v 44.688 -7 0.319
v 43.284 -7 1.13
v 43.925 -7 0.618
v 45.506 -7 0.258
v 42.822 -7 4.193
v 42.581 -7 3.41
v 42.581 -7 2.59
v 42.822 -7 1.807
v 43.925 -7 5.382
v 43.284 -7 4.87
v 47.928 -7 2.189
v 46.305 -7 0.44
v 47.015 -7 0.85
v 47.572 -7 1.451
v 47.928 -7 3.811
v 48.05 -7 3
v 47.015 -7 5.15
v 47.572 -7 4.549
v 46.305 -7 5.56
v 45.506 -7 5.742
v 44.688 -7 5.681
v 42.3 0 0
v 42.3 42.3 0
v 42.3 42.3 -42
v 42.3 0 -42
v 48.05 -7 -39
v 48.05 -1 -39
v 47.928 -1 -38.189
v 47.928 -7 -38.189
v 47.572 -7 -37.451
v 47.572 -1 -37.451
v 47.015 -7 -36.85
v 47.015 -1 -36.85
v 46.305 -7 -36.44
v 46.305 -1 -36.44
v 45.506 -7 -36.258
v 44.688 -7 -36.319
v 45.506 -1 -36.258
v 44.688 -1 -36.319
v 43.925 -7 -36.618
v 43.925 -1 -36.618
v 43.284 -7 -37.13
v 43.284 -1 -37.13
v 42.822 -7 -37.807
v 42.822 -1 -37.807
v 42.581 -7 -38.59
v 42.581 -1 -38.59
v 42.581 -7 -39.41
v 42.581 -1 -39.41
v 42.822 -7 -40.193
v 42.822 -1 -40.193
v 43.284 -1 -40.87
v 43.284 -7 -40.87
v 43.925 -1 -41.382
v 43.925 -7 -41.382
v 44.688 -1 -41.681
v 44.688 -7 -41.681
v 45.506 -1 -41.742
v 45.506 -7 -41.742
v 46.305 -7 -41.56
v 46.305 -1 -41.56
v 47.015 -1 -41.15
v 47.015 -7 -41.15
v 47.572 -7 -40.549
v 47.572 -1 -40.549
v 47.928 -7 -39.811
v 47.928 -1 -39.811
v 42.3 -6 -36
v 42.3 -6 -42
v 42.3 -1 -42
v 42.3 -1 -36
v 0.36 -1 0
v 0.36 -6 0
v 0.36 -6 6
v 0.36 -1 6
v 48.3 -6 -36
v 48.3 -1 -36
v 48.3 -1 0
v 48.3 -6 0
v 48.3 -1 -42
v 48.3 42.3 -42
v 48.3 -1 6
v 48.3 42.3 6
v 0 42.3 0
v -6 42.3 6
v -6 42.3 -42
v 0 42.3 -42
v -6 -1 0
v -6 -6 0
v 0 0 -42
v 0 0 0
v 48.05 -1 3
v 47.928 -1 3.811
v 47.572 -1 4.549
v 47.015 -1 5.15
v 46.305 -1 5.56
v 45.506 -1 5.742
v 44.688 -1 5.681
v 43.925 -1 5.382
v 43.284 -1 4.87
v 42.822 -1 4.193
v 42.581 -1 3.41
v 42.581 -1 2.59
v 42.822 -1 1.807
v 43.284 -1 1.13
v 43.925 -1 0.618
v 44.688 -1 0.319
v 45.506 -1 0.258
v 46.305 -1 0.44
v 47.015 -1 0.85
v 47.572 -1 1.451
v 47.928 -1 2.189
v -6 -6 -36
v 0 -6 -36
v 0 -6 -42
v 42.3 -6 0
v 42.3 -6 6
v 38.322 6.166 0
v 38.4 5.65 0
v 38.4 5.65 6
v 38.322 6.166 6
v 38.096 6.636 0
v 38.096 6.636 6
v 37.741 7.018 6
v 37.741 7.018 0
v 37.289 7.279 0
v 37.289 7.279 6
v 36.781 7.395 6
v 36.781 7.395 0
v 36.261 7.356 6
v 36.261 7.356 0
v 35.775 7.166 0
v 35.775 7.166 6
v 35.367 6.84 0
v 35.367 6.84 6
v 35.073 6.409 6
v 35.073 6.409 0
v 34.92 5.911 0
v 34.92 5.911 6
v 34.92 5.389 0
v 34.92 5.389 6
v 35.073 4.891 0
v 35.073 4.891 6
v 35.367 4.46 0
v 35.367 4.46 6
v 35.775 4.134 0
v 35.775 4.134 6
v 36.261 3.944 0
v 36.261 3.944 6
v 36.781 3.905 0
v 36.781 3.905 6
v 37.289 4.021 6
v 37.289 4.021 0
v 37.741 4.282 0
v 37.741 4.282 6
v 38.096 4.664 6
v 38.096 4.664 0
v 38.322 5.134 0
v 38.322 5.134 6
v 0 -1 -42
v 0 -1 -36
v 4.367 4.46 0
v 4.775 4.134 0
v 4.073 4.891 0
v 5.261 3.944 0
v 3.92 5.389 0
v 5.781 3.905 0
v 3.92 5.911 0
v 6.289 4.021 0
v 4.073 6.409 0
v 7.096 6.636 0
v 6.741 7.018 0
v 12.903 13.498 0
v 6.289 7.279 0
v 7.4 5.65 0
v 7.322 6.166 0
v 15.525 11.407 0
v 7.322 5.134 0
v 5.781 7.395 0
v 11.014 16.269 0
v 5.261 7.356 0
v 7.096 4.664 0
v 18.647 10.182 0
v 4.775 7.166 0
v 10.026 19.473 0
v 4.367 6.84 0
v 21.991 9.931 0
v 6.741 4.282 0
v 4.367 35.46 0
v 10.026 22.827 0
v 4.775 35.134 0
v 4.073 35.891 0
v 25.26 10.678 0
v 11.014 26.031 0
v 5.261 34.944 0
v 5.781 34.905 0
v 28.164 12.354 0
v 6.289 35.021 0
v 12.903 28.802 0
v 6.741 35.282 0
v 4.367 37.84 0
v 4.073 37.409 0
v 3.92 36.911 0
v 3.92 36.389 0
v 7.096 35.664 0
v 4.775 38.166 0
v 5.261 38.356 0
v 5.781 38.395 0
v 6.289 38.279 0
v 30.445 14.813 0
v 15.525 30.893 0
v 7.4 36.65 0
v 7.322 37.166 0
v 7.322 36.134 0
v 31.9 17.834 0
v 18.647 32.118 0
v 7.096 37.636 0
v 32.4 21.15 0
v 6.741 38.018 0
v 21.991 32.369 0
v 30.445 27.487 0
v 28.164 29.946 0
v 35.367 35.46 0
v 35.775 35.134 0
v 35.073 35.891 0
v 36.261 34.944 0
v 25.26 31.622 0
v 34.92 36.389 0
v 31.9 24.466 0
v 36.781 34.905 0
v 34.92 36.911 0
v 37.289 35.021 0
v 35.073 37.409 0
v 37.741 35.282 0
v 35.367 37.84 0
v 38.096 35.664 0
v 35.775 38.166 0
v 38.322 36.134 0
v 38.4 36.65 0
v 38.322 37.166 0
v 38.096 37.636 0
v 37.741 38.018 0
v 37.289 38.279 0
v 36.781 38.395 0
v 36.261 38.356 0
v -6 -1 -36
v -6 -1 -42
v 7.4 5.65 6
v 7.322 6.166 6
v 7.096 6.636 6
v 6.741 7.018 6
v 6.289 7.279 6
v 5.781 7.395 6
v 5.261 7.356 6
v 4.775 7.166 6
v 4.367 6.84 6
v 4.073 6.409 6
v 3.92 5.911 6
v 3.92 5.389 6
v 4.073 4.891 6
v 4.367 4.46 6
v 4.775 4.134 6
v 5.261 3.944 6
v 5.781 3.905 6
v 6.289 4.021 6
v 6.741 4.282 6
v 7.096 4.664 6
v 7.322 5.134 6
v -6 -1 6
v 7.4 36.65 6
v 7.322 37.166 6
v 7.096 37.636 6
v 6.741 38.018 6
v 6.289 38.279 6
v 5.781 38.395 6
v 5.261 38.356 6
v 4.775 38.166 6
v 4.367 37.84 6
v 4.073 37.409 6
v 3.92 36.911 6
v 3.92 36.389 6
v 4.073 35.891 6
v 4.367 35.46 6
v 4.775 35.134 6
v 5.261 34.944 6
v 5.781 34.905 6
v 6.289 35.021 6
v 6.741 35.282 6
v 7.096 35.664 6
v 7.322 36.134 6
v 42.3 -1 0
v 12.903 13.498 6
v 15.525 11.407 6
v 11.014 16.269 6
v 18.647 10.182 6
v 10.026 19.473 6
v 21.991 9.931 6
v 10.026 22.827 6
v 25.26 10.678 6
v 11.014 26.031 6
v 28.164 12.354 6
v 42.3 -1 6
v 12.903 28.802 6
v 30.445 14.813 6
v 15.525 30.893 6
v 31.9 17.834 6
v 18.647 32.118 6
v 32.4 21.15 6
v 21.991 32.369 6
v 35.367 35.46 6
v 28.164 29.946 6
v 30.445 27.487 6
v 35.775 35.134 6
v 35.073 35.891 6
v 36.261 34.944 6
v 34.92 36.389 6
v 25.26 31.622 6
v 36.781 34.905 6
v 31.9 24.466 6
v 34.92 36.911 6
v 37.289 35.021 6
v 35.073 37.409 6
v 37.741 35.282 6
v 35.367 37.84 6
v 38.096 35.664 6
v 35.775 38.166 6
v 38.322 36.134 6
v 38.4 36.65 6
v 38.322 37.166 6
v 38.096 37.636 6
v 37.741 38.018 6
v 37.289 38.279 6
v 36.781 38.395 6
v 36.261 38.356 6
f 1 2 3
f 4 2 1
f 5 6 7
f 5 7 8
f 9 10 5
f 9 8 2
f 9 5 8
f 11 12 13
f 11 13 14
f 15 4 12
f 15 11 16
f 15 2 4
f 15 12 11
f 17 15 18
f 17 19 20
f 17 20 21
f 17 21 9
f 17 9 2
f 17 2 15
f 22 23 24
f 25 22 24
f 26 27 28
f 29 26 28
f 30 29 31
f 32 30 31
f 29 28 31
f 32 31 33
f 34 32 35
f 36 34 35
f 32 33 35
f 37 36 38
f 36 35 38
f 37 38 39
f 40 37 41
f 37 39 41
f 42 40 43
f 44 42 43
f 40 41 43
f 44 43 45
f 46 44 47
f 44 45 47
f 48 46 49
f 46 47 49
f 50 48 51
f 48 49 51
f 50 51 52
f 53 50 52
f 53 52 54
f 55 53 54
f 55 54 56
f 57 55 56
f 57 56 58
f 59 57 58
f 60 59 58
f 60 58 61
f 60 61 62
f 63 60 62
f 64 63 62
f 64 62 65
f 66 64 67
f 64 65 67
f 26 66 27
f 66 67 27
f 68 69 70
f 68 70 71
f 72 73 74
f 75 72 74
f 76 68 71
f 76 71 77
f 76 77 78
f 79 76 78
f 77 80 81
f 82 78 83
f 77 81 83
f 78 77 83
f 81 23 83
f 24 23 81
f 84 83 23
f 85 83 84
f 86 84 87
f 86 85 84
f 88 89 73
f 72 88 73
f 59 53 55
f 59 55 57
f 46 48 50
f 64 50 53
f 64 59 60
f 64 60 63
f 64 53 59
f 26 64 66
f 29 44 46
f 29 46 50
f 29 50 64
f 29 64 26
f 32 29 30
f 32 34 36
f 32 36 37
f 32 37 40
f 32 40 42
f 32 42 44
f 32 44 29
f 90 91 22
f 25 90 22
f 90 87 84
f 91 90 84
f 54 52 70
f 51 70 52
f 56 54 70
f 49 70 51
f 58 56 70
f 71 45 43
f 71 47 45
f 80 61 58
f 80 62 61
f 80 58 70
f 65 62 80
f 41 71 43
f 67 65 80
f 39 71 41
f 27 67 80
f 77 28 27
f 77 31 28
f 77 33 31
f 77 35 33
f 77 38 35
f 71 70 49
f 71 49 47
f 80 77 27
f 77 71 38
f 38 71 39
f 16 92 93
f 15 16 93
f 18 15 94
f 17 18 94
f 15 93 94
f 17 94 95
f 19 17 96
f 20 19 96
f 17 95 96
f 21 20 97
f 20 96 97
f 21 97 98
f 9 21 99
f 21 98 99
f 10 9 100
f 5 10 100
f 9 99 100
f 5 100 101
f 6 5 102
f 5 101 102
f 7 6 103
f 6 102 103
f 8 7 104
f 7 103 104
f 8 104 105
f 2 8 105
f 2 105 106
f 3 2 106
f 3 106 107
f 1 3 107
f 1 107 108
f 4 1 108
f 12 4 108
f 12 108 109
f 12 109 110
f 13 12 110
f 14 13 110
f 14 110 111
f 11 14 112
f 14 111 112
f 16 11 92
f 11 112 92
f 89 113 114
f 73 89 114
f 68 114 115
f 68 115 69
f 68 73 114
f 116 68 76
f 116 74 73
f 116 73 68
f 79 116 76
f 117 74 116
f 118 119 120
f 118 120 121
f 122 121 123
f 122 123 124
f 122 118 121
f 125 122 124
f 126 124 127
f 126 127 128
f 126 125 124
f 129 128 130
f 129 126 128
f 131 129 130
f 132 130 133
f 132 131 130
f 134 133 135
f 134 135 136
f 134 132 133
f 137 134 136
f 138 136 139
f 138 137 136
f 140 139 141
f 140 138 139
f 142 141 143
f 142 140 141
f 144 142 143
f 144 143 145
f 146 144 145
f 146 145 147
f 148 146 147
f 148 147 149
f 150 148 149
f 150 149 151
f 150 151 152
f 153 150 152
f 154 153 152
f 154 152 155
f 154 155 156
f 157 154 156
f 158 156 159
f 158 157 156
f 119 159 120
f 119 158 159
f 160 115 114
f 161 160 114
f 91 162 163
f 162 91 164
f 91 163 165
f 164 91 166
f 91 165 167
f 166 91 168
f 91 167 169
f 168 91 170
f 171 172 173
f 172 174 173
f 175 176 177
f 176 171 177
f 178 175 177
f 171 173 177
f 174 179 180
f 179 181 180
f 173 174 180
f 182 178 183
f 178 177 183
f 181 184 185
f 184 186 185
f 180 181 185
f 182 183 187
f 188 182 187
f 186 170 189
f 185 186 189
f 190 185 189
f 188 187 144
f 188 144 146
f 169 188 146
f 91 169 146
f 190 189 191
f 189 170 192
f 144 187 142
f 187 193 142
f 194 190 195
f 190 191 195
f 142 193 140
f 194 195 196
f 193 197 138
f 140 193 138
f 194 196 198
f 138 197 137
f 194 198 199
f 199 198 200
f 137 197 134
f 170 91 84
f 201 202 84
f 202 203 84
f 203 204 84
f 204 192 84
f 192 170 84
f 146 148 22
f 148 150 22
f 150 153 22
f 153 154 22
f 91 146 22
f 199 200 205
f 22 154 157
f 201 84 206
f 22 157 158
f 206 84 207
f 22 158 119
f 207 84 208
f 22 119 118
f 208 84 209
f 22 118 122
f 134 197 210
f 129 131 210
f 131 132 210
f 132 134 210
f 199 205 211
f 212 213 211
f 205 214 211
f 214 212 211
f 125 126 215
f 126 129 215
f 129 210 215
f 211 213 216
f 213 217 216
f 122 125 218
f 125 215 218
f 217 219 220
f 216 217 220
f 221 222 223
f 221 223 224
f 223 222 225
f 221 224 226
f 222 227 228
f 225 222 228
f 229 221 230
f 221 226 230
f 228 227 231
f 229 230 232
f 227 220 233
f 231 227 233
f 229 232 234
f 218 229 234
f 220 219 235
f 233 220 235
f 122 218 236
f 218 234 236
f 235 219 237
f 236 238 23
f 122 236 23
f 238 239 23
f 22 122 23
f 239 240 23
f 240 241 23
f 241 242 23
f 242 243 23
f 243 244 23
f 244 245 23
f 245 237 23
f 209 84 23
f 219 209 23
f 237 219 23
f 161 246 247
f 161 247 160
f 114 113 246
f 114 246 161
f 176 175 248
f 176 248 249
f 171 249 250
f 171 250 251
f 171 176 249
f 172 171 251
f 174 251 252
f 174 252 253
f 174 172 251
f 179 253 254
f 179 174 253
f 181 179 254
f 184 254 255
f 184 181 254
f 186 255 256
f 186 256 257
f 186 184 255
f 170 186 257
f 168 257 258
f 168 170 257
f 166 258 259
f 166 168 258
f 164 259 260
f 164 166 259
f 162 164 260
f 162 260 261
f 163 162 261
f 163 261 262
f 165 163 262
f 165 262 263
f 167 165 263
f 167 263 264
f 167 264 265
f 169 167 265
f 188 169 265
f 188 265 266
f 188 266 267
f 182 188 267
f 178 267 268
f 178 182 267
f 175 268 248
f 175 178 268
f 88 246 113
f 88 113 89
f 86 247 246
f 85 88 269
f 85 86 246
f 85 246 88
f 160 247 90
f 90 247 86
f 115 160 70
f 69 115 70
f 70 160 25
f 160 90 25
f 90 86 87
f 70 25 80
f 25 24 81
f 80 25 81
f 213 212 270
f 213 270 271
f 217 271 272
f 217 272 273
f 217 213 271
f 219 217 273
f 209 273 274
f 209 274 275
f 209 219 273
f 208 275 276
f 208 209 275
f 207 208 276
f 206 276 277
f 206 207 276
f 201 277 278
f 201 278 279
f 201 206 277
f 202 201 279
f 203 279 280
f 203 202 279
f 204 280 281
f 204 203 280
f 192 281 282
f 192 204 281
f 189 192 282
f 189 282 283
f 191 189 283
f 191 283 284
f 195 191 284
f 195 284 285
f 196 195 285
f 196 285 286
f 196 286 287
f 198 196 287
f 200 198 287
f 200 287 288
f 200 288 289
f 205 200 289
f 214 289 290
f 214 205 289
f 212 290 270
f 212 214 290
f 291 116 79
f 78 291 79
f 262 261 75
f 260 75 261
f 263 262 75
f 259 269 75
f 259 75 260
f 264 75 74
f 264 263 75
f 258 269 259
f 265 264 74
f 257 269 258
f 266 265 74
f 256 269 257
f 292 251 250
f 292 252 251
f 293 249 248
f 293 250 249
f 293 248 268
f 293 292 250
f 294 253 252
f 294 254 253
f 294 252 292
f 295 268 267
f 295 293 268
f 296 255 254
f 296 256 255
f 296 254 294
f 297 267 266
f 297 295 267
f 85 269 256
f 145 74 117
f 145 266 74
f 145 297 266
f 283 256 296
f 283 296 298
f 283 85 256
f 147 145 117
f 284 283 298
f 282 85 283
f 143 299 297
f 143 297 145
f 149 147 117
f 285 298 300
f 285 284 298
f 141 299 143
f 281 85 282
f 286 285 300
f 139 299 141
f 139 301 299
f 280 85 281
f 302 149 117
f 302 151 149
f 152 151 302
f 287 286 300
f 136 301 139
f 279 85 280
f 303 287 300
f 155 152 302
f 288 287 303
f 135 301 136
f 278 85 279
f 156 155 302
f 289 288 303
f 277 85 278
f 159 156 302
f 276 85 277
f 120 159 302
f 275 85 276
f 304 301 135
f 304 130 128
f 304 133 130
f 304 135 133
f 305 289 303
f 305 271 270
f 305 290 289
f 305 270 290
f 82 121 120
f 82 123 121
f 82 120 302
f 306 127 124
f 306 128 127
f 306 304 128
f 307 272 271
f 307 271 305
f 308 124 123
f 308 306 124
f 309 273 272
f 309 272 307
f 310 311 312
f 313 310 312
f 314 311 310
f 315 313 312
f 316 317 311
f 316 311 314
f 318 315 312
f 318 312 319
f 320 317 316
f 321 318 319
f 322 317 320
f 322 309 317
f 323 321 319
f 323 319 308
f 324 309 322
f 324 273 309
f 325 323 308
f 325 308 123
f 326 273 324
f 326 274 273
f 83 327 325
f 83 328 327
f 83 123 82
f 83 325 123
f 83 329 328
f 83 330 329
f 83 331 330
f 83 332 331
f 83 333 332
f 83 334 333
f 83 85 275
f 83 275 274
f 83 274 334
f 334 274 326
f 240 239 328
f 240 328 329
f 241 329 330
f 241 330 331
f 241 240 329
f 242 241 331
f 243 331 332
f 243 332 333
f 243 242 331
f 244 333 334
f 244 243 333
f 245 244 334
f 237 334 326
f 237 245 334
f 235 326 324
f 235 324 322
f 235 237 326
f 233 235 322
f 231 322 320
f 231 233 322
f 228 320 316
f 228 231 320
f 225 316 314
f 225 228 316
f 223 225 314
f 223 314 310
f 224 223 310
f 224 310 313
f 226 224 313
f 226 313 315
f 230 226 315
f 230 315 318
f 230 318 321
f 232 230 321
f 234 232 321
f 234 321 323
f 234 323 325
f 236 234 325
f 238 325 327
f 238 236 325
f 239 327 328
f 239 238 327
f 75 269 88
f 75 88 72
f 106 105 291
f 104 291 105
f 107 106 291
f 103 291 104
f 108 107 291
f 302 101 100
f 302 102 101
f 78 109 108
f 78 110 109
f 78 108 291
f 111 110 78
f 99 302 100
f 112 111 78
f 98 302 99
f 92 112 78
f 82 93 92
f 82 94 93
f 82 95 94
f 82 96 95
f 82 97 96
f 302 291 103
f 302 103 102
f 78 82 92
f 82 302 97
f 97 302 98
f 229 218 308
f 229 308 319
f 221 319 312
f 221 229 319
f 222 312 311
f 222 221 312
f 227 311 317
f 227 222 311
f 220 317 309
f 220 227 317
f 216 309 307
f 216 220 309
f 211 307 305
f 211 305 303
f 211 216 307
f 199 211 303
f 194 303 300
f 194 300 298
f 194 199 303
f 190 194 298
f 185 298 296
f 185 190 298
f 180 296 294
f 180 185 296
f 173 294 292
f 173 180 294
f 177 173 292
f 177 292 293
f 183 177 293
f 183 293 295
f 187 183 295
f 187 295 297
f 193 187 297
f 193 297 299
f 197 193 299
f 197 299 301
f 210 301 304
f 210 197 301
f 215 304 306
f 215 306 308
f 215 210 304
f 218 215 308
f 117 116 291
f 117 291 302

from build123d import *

# Parameters (mm, degrees)
SKETCH_1_W          = 42.3
SKETCH_1_H          = 42.3
SKETCH_1_R          = 1.75
SKETCH_1_R_2        = 11.25
EXTRUDE_1_DEPTH     = 6
SKETCH_2_W          = 48
SKETCH_2_H          = 42.3
EXTRUDE_2_DEPTH     = 6
SKETCH_3_W          = 48
SKETCH_3_H          = 42.3
EXTRUDE_3_DEPTH     = 6
SKETCH_4_W          = 54.3
SKETCH_4_H          = 48
EXTRUDE_4_DEPTH     = 6
SKETCH_5_W          = 6
SKETCH_5_H          = 6
SKETCH_5_W_2        = 6.359997754
CUT_EXTRUDE_1_DEPTH = 5
SKETCH_6_R          = 2.75
EXTRUDE_5_DEPTH     = 6
SKETCH_7_R          = 2.75
EXTRUDE_6_DEPTH     = 6


with BuildPart() as part:
    # Эскиз1 → Бобышка-Вытянуть1 (new body)
    with BuildSketch(Plane.XY):
        with Locations((21.15, 21.15)):
            Rectangle(SKETCH_1_W, SKETCH_1_H)
        with Locations((36.65, 36.65)):
            Circle(SKETCH_1_R, mode=Mode.SUBTRACT)
        with Locations((5.65, 36.65)):
            Circle(SKETCH_1_R, mode=Mode.SUBTRACT)
        with Locations((5.65, 5.65)):
            Circle(SKETCH_1_R, mode=Mode.SUBTRACT)
        with Locations((36.65, 5.65)):
            Circle(SKETCH_1_R, mode=Mode.SUBTRACT)
        with Locations((21.15, 21.15)):
            Circle(SKETCH_1_R_2, mode=Mode.SUBTRACT)
    extrude(amount=EXTRUDE_1_DEPTH)

    # Эскиз2 → Бобышка-Вытянуть2 (add)
    with BuildSketch(Plane.ZY):
        with Locations((-18, 21.15)):
            Rectangle(SKETCH_2_W, SKETCH_2_H)
    extrude(amount=EXTRUDE_2_DEPTH)

    # Эскиз3 → Бобышка-Вытянуть3 (add)
    with BuildSketch(Plane(origin=(42.3, 0, 0), x_dir=(0, 0, -1), z_dir=(1, 0, 0))):
        with Locations((18, 21.15)):
            Rectangle(SKETCH_3_W, SKETCH_3_H)
    extrude(amount=EXTRUDE_3_DEPTH)

    # Эскиз4 → Бобышка-Вытянуть4 (add)
    with BuildSketch(Plane.XZ):
        with Locations((21.15, -18)):
            Rectangle(SKETCH_4_W, SKETCH_4_H)
    extrude(amount=EXTRUDE_4_DEPTH)

    # Эскиз5 → Вырез-Вытянуть1 (cut)
    with BuildSketch(Plane.XZ.offset(6)):
        with Locations((45.3, -39)):
            Rectangle(SKETCH_5_W, SKETCH_5_H)
        with Locations((-3, -39)):
            Rectangle(SKETCH_5_W, SKETCH_5_H)
        with Locations((-2.820001123, 3)):
            Rectangle(SKETCH_5_W_2, SKETCH_5_H)
        with Locations((45.3, 3)):
            Rectangle(SKETCH_5_W, SKETCH_5_H)
    extrude(amount=-CUT_EXTRUDE_1_DEPTH, mode=Mode.SUBTRACT)

    # Эскиз6 → Бобышка-Вытянуть5 (add)
    with BuildSketch(Plane.XZ.offset(1)):
        with Locations((45.3, 3)):
            Circle(SKETCH_6_R)
    extrude(amount=EXTRUDE_5_DEPTH)

    # Эскиз7 → Бобышка-Вытянуть6 (add)
    with BuildSketch(Plane.XZ.offset(1)):
        with Locations((45.3, -39)):
            Circle(SKETCH_7_R)
    extrude(amount=EXTRUDE_6_DEPTH)


solid = part.part
